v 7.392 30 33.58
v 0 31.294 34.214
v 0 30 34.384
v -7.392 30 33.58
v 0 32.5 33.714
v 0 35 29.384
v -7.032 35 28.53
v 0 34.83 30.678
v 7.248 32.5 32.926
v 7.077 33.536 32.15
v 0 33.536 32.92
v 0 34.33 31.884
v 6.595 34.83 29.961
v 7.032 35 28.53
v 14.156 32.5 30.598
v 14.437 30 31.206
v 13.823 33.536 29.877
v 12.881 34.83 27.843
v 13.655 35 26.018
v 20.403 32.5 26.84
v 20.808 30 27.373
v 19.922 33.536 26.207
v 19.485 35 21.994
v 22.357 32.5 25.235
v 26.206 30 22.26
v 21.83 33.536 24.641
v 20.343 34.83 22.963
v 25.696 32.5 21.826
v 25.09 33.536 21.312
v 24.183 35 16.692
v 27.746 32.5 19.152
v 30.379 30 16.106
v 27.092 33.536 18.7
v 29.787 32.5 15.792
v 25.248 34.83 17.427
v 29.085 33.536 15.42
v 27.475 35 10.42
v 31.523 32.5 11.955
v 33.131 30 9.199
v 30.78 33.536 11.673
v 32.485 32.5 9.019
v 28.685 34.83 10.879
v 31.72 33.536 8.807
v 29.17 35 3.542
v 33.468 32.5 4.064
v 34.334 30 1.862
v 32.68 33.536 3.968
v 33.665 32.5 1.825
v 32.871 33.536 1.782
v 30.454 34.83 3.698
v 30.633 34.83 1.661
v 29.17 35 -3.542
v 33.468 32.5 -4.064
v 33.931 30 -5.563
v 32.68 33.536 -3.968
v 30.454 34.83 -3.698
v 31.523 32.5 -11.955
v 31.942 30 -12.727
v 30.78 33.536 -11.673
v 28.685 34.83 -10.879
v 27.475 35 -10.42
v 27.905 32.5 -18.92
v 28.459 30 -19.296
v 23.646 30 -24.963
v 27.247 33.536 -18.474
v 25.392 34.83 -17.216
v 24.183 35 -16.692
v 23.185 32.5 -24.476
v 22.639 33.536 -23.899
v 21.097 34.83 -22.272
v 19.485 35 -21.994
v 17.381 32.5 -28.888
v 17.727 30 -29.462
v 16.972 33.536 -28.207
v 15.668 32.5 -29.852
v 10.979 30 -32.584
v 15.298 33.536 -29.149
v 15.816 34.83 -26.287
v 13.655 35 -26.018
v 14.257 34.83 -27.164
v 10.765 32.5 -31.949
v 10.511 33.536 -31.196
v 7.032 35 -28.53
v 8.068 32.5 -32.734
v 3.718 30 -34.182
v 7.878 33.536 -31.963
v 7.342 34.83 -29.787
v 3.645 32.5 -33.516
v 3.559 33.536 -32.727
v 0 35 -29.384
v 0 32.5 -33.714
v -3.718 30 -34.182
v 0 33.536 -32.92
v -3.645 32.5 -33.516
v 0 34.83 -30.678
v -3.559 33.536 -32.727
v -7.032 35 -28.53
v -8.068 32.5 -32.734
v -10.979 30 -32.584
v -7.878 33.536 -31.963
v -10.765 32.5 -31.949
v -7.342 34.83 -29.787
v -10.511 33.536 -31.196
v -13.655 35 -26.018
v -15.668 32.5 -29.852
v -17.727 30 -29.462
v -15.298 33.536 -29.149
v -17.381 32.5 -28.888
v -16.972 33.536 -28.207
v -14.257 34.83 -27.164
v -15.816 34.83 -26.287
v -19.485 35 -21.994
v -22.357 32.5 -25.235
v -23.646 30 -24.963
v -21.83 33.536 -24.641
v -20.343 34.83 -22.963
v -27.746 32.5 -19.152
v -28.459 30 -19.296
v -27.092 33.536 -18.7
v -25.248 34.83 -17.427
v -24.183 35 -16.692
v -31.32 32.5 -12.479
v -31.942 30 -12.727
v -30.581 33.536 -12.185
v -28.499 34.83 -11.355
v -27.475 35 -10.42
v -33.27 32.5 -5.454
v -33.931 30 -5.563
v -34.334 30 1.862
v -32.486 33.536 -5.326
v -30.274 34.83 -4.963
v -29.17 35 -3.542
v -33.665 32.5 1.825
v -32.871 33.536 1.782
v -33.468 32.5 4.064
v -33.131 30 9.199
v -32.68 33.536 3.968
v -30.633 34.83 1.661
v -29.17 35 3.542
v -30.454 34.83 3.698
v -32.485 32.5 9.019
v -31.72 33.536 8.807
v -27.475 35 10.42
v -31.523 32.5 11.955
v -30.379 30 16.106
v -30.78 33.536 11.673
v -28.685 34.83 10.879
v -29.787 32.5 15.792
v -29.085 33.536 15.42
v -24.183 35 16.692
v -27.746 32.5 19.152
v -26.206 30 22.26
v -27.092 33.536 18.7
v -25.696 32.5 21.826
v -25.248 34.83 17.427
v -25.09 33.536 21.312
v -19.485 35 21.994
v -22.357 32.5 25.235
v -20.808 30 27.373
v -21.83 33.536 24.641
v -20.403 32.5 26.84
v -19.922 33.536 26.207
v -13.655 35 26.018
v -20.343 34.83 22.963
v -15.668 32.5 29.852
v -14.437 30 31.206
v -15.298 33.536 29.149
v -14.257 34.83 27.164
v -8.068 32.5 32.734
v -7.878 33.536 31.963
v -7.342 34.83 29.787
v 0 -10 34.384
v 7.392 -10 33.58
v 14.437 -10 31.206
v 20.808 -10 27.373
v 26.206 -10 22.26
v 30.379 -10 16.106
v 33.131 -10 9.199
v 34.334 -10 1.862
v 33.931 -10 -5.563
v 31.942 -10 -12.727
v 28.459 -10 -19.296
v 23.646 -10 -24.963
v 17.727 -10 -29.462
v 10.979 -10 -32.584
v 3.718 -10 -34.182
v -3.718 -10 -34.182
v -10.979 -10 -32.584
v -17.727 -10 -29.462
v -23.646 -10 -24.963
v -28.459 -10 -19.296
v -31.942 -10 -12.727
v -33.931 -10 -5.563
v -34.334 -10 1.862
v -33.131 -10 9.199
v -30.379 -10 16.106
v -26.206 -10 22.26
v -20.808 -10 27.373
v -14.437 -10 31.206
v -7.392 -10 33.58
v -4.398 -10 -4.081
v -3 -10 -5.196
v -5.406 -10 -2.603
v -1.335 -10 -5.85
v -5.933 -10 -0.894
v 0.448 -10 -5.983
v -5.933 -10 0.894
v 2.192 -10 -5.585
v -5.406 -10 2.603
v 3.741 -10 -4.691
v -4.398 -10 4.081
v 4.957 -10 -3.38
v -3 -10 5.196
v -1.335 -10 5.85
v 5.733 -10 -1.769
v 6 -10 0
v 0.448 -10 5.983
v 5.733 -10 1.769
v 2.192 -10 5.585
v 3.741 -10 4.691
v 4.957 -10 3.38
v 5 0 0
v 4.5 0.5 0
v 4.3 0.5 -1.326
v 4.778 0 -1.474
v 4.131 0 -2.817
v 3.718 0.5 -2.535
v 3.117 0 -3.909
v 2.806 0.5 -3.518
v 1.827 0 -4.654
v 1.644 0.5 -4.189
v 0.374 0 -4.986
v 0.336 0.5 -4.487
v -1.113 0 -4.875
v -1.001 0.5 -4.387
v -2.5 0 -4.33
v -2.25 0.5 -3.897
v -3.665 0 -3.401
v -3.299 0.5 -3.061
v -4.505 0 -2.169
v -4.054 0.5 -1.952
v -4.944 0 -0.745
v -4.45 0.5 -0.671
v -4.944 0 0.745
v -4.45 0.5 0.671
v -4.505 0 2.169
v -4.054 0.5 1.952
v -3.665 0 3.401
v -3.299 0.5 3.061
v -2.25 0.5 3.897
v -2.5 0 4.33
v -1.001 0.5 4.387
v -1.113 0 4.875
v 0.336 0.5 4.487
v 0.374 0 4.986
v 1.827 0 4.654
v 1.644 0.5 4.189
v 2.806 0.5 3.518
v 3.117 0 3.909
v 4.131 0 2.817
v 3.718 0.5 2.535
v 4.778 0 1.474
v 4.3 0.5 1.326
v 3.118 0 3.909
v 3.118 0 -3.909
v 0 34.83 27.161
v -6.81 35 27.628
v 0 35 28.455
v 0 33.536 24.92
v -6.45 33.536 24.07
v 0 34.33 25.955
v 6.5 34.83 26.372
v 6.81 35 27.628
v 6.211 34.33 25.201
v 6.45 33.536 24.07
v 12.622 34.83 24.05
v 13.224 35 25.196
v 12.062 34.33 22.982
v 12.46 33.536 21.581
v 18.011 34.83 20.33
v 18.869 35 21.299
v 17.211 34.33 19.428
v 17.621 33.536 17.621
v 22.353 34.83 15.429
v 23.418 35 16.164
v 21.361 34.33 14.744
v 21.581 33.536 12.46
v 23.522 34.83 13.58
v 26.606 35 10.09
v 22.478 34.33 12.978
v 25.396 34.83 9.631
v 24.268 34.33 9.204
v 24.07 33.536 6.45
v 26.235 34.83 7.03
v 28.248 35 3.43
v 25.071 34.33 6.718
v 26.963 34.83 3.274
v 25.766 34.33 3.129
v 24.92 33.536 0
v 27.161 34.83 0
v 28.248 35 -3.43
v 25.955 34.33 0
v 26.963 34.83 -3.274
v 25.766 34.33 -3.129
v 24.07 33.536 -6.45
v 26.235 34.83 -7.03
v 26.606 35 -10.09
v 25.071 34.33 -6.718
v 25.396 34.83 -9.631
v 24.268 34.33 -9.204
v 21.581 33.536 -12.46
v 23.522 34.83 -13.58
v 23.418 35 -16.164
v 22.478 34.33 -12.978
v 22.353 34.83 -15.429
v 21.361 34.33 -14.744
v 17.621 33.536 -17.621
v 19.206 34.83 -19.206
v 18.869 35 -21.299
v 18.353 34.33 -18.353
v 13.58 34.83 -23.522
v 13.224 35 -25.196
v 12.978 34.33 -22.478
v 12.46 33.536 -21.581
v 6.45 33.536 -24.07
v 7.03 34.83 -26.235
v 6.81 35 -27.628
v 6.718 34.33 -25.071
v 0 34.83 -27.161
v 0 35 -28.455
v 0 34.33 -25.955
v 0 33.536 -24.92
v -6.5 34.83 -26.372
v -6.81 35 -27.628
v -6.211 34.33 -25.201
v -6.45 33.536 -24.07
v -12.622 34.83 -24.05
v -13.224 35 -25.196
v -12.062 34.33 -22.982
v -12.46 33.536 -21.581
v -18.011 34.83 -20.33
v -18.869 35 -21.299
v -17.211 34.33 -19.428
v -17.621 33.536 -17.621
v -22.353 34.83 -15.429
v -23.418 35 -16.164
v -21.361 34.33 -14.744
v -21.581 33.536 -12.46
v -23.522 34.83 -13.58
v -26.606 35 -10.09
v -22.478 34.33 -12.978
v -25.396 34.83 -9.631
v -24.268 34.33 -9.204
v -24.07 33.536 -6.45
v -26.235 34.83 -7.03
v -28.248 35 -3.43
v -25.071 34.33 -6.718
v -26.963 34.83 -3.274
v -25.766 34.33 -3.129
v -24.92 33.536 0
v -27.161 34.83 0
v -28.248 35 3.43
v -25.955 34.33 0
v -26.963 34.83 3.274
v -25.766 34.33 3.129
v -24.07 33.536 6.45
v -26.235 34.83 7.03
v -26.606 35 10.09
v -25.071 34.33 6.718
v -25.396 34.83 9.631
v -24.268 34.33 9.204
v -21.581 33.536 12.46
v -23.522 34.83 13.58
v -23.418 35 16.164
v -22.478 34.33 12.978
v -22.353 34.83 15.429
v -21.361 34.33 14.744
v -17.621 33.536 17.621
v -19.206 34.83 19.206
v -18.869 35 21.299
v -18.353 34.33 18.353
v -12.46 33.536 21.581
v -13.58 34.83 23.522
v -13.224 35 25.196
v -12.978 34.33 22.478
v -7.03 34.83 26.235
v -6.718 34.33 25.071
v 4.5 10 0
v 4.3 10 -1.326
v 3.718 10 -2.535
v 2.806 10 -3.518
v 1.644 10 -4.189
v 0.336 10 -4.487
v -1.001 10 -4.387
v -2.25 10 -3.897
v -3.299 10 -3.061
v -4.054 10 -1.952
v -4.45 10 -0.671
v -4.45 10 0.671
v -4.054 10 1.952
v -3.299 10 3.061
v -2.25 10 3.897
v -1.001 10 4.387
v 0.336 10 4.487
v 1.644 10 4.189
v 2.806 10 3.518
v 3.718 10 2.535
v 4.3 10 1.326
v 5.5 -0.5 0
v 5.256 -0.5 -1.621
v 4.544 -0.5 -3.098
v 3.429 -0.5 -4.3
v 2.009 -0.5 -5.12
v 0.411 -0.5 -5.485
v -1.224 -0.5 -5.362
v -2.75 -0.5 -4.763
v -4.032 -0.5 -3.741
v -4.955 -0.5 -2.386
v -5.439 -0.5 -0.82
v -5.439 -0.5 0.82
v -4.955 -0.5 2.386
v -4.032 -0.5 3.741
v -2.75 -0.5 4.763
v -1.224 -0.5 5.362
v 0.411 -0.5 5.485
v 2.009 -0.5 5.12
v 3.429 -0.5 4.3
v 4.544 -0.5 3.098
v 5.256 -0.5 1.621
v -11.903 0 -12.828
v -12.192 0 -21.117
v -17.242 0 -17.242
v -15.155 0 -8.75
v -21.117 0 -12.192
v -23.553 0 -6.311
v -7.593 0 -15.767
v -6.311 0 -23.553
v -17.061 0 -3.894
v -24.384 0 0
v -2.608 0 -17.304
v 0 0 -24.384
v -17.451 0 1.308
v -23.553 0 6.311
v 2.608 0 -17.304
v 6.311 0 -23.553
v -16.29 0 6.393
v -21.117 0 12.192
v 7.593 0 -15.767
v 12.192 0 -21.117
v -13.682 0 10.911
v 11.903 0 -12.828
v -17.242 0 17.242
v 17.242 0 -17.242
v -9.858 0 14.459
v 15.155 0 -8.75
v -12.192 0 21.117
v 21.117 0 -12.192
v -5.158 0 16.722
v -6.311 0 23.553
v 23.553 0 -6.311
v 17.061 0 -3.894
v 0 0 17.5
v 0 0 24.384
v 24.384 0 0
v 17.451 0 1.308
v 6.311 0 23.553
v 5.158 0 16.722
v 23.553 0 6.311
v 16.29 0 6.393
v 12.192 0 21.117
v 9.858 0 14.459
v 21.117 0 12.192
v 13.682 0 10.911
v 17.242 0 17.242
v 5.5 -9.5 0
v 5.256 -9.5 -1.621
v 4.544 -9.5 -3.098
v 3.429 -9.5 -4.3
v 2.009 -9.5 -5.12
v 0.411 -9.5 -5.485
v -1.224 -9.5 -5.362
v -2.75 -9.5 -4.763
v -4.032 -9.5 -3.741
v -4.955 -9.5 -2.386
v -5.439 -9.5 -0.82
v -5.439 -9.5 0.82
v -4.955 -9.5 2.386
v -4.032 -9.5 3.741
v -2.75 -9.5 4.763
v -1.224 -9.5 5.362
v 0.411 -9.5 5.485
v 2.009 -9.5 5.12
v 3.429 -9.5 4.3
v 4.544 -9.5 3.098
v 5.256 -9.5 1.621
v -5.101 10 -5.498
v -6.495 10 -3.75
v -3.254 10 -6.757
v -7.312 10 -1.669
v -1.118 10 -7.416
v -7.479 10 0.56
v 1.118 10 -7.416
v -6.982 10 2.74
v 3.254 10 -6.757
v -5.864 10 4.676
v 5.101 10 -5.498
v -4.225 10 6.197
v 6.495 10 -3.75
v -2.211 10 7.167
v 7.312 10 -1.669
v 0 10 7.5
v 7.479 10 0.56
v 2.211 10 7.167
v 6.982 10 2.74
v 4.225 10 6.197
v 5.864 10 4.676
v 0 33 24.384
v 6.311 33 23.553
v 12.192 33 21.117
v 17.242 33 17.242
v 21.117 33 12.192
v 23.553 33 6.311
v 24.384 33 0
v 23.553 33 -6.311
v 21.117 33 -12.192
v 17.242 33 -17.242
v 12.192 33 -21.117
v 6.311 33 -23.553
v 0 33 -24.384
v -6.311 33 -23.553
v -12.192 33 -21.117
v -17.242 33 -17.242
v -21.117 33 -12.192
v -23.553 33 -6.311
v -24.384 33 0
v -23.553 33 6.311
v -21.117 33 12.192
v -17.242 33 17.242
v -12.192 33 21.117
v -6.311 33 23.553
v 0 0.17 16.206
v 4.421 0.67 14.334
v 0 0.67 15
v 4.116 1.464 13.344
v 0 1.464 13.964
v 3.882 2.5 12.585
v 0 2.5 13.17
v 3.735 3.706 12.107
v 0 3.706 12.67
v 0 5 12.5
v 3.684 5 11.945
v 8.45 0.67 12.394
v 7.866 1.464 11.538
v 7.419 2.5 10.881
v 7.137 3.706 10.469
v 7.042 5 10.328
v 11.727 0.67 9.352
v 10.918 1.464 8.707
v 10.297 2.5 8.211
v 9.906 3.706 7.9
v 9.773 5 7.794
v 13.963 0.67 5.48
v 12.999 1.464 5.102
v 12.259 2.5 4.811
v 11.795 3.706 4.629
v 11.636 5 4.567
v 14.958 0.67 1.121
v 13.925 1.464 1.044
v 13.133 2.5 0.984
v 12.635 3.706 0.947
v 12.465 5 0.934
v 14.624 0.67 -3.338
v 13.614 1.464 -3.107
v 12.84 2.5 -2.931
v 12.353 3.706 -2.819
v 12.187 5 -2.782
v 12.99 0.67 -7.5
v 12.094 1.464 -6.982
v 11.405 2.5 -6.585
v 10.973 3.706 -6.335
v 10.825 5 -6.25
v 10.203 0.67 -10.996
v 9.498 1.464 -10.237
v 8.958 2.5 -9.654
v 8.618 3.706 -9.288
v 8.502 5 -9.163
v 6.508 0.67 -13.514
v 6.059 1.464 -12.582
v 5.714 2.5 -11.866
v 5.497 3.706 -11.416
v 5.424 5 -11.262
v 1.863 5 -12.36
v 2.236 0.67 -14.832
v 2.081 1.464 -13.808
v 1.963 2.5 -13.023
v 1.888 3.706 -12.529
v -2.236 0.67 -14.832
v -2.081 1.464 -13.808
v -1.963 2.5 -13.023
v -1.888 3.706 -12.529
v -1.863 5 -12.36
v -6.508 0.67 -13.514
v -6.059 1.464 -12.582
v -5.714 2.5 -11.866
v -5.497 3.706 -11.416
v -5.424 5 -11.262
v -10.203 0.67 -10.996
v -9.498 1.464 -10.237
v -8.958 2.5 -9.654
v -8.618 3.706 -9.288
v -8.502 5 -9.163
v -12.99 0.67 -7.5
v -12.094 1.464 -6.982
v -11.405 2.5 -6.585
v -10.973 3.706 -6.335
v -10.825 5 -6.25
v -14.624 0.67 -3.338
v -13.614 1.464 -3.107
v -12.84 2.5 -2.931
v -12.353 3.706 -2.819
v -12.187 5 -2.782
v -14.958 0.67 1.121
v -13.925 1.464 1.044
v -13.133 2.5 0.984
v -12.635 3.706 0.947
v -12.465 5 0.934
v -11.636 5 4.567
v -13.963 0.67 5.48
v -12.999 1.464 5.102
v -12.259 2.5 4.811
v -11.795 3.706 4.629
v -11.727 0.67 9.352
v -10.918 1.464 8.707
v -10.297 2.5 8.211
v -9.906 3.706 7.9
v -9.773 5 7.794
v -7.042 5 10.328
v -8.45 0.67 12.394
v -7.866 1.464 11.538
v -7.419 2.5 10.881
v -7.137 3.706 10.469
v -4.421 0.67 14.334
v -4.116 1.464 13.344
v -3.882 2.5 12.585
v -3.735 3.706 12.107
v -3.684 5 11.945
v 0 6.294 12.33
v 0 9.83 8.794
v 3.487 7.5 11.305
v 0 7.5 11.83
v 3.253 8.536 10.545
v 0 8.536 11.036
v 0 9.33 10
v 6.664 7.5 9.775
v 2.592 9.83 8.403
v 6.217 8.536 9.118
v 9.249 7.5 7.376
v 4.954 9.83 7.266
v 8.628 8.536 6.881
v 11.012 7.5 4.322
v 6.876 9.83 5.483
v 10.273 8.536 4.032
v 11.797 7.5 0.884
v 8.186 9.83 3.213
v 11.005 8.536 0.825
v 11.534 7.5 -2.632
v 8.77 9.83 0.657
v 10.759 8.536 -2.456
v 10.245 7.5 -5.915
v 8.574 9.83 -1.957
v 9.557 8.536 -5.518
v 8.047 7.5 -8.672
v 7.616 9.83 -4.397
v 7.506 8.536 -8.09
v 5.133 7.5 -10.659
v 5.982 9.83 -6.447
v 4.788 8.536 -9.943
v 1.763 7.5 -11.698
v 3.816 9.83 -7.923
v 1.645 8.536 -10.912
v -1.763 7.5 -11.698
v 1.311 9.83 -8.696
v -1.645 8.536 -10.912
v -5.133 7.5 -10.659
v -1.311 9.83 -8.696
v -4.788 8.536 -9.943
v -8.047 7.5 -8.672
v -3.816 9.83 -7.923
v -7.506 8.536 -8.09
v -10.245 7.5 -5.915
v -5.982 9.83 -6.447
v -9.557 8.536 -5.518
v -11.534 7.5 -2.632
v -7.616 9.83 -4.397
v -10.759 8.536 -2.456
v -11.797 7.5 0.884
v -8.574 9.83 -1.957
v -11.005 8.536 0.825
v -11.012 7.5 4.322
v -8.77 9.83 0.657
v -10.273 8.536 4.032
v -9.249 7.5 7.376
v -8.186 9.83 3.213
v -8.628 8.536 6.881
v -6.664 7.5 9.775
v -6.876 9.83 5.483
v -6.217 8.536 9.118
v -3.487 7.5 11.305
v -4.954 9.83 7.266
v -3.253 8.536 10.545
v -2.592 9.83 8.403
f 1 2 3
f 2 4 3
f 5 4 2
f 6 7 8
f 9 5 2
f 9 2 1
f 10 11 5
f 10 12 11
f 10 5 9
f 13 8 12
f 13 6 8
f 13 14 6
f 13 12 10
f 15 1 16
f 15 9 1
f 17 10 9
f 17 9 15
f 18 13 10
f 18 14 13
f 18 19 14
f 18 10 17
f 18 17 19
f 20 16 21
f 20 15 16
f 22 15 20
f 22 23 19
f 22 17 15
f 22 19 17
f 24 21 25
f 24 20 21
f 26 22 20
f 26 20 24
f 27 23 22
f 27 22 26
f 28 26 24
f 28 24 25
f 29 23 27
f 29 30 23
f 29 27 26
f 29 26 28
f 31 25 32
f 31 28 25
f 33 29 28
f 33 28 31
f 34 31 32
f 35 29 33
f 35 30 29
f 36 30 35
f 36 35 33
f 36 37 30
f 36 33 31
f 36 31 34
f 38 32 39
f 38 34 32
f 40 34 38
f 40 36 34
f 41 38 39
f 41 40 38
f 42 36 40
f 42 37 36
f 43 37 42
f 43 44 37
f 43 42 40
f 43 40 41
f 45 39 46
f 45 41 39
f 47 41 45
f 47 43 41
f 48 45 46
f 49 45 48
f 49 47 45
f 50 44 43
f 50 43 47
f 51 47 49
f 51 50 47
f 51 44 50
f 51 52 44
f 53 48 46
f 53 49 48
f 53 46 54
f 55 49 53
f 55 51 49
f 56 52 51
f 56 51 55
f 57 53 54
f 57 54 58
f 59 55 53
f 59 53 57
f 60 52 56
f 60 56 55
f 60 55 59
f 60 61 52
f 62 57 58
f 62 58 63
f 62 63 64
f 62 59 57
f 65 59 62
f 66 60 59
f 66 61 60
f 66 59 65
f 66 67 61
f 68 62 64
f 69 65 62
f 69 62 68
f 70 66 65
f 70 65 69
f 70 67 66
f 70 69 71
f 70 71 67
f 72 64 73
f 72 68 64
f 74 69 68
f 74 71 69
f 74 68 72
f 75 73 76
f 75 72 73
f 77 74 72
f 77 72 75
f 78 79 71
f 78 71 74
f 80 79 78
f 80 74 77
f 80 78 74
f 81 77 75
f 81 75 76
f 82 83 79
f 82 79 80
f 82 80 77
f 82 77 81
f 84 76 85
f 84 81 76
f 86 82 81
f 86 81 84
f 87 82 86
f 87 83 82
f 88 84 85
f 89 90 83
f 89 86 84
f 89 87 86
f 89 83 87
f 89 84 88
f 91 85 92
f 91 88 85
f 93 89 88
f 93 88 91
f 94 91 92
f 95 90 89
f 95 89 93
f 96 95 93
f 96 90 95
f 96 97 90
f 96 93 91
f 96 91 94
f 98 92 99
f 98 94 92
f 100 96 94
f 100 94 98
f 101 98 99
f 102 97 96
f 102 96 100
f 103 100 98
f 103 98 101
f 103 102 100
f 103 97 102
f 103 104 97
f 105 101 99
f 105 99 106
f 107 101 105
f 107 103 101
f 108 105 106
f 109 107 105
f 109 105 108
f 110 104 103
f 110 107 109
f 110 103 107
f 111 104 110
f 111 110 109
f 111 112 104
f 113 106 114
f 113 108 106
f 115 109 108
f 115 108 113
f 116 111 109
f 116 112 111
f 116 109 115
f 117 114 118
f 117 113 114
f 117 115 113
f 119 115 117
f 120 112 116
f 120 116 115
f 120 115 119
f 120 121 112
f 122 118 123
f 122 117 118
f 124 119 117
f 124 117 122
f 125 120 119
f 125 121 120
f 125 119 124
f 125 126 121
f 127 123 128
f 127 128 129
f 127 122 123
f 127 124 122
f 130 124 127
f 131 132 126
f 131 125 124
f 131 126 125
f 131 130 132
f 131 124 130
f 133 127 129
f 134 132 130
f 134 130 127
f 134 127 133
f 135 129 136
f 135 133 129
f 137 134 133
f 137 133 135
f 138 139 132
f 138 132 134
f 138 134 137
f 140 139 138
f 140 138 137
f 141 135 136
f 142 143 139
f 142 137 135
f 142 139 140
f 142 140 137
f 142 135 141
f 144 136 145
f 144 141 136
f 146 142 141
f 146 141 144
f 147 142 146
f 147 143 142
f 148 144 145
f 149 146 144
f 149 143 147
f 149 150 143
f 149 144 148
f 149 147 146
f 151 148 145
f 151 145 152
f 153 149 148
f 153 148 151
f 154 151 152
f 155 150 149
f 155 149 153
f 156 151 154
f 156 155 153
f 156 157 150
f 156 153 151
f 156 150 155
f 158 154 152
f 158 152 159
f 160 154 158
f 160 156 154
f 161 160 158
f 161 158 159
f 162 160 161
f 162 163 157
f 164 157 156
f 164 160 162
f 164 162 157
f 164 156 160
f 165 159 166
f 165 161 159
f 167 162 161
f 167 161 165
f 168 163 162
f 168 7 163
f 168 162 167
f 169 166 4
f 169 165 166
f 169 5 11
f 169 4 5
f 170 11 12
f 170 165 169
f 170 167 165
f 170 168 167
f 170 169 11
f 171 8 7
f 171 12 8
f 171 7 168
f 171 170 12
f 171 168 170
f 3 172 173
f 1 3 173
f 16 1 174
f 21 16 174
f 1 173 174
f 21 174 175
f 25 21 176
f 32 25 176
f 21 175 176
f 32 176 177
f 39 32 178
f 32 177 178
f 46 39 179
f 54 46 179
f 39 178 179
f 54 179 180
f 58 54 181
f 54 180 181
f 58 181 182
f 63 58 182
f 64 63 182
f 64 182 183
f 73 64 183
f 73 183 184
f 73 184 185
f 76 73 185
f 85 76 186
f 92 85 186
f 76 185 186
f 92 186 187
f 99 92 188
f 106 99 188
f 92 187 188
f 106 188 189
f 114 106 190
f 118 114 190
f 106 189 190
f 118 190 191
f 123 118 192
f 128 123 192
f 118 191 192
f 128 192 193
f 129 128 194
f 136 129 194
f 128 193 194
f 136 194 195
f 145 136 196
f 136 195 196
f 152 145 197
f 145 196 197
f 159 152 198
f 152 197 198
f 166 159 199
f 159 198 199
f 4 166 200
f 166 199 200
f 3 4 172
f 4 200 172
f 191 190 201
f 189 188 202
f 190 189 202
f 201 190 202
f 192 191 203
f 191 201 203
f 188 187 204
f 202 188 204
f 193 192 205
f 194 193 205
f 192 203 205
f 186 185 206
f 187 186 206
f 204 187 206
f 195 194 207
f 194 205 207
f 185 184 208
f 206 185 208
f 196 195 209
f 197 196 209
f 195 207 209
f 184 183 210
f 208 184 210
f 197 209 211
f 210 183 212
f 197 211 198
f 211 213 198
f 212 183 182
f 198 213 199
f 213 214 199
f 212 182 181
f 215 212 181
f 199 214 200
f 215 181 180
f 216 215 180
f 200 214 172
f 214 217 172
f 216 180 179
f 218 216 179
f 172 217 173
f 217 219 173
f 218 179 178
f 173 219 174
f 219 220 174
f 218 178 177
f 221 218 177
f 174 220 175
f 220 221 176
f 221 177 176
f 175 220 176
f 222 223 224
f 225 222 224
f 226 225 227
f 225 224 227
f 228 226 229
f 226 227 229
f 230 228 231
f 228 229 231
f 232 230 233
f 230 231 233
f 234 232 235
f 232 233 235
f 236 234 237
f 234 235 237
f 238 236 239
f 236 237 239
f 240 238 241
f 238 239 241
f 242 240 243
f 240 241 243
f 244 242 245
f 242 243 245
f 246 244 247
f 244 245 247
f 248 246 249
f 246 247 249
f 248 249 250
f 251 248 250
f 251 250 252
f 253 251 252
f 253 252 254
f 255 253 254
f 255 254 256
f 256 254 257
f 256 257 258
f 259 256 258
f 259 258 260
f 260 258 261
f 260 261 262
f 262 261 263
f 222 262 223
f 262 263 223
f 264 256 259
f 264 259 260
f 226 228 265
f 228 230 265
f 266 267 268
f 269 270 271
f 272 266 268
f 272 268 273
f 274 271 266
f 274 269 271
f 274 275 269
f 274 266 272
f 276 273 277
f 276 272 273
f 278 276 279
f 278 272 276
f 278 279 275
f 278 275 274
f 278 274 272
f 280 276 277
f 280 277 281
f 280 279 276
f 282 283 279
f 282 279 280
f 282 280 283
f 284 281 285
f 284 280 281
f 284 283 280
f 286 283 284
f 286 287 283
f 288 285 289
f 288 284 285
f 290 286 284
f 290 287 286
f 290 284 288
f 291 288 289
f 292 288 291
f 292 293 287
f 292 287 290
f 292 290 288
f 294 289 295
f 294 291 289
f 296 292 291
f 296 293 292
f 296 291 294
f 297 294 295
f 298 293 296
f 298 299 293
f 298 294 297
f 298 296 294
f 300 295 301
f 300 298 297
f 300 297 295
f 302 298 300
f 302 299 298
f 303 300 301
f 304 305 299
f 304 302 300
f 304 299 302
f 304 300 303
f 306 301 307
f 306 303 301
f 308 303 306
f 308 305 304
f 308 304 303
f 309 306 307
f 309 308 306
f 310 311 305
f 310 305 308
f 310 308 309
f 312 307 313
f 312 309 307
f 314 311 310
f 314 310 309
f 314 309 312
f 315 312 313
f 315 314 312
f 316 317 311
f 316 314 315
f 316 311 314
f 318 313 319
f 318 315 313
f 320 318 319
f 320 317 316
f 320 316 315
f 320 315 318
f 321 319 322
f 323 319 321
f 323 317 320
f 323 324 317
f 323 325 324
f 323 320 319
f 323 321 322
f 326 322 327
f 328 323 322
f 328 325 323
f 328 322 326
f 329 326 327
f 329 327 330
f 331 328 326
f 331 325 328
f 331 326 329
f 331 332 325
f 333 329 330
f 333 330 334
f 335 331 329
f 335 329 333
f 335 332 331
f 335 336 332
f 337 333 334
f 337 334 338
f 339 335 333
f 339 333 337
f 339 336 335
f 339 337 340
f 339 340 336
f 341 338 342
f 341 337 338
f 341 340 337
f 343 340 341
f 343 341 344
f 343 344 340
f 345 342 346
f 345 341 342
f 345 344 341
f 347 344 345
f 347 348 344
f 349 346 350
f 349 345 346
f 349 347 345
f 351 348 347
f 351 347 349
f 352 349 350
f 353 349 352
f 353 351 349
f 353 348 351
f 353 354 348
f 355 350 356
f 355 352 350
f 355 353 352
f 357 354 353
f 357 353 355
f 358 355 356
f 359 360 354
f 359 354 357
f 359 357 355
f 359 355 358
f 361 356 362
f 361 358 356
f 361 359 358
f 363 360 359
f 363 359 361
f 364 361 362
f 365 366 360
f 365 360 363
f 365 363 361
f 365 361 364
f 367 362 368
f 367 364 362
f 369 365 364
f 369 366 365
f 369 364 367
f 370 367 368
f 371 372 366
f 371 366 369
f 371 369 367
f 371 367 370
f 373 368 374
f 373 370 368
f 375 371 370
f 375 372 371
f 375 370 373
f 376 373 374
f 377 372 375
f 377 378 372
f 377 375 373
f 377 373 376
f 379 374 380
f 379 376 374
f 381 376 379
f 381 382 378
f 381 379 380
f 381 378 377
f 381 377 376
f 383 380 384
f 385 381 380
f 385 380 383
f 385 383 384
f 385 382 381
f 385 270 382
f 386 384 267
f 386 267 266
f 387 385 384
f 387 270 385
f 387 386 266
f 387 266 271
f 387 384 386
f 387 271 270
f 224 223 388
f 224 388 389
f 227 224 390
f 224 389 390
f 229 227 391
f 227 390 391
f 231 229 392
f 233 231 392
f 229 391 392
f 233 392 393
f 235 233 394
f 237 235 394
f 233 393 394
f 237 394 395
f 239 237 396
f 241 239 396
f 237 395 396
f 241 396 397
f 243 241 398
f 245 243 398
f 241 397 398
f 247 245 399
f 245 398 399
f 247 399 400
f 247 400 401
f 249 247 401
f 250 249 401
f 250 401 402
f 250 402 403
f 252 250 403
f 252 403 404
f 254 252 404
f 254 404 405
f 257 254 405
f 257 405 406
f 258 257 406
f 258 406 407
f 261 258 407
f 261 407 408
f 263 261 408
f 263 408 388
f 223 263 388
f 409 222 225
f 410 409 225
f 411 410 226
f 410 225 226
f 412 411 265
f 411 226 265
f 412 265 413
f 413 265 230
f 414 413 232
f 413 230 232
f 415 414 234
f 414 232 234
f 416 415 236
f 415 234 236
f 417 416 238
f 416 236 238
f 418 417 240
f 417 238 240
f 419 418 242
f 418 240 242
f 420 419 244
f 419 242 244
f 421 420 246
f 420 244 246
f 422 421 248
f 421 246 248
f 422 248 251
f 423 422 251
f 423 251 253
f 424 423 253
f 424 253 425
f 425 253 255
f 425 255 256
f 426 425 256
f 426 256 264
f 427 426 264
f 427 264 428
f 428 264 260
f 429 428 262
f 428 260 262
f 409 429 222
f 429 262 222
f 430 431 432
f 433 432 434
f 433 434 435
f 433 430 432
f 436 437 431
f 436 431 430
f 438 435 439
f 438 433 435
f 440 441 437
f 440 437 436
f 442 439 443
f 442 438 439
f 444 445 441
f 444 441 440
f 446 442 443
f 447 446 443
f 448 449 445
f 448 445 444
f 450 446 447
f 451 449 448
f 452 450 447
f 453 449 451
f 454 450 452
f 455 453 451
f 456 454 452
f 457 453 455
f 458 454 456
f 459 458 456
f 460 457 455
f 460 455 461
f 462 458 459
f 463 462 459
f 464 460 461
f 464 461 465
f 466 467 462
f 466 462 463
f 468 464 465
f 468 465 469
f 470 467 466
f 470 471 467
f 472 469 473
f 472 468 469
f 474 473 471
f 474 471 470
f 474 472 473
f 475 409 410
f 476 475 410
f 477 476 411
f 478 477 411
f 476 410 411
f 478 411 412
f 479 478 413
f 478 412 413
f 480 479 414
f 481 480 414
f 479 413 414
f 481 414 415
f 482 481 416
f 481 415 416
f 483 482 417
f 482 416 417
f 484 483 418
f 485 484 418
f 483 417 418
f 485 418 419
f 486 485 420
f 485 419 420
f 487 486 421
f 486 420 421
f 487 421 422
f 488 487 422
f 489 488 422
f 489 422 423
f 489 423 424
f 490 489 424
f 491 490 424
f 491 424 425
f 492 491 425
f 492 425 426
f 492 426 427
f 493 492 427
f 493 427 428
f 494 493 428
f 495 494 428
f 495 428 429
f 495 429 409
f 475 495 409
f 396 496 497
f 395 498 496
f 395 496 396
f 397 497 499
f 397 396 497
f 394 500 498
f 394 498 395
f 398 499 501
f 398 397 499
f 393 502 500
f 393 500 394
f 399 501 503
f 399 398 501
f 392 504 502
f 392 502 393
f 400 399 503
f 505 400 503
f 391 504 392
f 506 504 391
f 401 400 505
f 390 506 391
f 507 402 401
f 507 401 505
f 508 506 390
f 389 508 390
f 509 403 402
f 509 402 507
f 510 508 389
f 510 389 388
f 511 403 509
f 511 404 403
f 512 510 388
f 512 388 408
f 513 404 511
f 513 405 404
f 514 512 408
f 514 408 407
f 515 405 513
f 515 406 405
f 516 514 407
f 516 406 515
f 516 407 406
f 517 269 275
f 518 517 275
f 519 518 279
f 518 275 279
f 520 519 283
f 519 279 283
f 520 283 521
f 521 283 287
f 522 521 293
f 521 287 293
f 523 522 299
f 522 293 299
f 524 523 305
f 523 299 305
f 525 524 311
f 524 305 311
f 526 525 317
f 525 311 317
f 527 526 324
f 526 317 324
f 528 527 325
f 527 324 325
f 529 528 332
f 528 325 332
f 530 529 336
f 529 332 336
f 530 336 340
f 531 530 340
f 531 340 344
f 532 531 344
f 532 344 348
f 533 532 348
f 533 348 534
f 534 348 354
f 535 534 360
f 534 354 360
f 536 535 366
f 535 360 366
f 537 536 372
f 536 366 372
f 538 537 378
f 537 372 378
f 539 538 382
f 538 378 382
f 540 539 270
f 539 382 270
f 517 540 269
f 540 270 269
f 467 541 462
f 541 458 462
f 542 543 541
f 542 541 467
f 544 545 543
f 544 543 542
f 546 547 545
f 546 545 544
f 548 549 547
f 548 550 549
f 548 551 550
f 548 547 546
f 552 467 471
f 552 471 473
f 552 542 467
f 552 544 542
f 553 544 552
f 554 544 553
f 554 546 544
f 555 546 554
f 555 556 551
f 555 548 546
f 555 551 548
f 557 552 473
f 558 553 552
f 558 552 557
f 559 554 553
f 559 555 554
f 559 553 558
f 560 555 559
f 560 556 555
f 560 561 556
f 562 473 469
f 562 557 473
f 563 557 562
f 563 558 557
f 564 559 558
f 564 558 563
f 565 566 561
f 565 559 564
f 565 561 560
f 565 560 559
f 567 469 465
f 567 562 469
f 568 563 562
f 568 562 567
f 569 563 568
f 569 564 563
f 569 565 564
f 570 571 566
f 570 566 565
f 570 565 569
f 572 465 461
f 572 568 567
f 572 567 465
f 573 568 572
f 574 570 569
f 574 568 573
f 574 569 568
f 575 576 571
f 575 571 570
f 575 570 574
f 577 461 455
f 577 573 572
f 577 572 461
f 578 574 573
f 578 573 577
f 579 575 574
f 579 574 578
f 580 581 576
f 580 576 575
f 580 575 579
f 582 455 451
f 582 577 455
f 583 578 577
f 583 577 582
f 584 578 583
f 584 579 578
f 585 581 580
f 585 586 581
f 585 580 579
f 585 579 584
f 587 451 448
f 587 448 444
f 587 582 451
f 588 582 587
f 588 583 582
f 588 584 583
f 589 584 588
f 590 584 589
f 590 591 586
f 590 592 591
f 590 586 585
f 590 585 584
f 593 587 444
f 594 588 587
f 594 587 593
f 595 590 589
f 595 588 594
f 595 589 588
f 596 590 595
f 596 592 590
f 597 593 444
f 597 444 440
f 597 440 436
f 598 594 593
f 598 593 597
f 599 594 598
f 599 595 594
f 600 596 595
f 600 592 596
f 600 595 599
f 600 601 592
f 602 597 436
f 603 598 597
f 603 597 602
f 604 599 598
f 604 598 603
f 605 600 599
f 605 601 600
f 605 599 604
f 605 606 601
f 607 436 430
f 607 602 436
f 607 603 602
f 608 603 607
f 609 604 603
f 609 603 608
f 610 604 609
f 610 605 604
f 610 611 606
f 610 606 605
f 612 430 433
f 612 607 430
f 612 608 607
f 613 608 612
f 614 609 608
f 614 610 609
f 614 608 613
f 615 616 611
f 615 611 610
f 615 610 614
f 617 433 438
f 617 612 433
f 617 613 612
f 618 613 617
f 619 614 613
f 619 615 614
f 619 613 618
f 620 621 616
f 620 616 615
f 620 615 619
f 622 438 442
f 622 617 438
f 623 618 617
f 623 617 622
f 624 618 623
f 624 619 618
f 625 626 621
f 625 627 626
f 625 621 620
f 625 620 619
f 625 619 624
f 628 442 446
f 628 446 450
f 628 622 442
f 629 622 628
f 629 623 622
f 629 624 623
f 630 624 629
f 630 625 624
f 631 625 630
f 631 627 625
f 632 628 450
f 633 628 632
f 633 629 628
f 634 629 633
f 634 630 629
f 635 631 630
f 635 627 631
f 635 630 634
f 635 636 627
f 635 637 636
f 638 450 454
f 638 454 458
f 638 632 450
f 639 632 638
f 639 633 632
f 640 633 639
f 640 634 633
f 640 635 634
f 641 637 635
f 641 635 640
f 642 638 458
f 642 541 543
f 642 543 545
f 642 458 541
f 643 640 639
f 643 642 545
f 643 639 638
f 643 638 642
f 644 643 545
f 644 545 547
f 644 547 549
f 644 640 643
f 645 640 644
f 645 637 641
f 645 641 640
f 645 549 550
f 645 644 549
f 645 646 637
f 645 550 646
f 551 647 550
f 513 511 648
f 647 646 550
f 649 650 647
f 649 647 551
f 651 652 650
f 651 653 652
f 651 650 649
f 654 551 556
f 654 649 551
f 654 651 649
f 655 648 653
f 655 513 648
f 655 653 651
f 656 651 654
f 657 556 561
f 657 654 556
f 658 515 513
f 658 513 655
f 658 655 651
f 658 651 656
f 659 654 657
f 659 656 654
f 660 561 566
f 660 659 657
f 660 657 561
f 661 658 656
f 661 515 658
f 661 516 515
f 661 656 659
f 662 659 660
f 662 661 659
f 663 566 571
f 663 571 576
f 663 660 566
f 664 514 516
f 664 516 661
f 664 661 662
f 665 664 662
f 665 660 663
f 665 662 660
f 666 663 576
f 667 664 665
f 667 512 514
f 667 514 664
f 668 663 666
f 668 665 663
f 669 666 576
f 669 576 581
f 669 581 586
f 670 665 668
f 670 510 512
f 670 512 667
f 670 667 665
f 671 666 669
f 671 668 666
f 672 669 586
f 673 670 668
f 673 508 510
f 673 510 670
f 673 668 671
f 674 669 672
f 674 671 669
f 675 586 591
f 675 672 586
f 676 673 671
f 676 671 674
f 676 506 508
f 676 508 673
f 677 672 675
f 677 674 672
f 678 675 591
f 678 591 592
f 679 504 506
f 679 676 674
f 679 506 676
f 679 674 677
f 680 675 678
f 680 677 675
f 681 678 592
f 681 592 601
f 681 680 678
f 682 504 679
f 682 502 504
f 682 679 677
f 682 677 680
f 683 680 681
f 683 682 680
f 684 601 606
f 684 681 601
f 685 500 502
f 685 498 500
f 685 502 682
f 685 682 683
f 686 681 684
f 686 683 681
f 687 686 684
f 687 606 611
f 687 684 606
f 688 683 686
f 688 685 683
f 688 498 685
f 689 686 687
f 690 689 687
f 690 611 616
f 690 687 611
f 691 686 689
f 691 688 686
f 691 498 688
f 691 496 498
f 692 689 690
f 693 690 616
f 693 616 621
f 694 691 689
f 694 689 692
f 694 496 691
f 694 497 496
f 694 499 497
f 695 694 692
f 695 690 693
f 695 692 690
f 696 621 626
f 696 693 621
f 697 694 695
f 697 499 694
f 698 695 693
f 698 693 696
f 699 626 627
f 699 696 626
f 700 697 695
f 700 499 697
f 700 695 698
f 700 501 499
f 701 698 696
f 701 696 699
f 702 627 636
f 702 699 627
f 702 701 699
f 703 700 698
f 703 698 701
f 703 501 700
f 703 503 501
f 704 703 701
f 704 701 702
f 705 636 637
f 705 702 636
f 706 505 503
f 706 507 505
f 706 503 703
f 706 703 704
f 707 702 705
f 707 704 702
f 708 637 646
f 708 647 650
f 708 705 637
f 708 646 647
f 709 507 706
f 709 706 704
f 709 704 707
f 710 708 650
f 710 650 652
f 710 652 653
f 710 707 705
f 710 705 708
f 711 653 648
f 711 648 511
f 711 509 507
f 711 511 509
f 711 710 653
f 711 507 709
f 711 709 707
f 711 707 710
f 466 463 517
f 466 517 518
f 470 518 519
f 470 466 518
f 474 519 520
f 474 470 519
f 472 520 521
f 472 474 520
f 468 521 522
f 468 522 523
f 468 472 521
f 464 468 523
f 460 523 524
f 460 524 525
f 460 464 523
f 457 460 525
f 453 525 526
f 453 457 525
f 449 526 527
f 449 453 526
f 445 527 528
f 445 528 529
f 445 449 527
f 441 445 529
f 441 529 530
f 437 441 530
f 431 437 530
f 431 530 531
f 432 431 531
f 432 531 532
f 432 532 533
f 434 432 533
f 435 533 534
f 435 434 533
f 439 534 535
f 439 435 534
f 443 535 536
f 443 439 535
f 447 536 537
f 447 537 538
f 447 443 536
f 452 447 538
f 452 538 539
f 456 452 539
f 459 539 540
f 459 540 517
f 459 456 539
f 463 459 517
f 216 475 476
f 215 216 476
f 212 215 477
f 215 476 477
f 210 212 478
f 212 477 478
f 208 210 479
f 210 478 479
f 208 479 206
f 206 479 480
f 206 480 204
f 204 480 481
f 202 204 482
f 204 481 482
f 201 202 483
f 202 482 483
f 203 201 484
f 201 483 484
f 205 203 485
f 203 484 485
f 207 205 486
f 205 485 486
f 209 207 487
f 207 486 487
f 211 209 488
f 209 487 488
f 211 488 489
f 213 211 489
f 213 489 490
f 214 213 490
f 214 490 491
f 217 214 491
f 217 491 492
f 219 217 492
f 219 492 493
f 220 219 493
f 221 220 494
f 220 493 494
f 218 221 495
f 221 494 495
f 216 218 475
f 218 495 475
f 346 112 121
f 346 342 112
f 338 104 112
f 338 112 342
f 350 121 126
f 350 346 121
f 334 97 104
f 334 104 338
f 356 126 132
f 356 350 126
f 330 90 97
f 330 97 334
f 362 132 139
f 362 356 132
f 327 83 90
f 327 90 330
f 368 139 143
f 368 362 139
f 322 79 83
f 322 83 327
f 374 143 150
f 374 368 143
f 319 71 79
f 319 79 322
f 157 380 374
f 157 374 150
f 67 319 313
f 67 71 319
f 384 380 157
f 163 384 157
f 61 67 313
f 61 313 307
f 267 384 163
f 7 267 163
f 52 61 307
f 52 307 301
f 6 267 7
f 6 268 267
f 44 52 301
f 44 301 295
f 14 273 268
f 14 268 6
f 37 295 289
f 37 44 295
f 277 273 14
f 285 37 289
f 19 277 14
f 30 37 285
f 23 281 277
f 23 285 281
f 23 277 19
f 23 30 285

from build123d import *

# Parameters (mm, degrees)
SKETCH1_R                  = 34.384
SKETCH1_R_2                = 24.384
BOSS_EXTRUDE1_DEPTH        = 35
BOSS_EXTRUDE2_START        = -10
SKETCH1_3_R                = 34.384
BOSS_EXTRUDE2_DEPTH        = 10
SKETCH3_R                  = 12.5
BOSS_EXTRUDE3_DEPTH        = 10
FILLET1_R                  = 5
F_12_0MM_DOWEL_HOLE1_D     = 11
F_12_0MM_DOWEL_HOLE1_DEPTH = 10
F_8_0MM_DOWEL_HOLE2_D      = 9
CHAMFER1_SIZE              = 2
CHAMFER2_SIZE              = 0.5
CHAMFER4_SIZE              = 0.5
FILLET2_R                  = 5


with BuildPart() as part:
    # Sketch1 → Boss-Extrude1 (new body)
    with BuildSketch(Plane(origin=(0, 0, 0), x_dir=(1, 0, 0), z_dir=(0, 1, 0))):
        with Locations(Location((0, 0, 0), (0, 0, 270))):
            Circle(SKETCH1_R)
        with Locations(Location((0, 0, 0), (0, 0, 270))):
            Circle(SKETCH1_R_2, mode=Mode.SUBTRACT)
    extrude(amount=BOSS_EXTRUDE1_DEPTH)

    # Sketch1<3> → Boss-Extrude2 (add)
    with BuildSketch(Plane(origin=(0, 0, 0), x_dir=(1, 0, 0), z_dir=(0, 1, 0)).offset(BOSS_EXTRUDE2_START)):
        with Locations(Location((0, 0, 0), (0, 0, 270))):
            Circle(SKETCH1_3_R)
    extrude(amount=BOSS_EXTRUDE2_DEPTH)

    # Sketch3 → Boss-Extrude3 (add)
    with BuildSketch(Plane(origin=(0, 0, 0), x_dir=(1, 0, 0), z_dir=(0, 1, 0))):
        with Locations(Location((0, 0, 0), (0, 0, 270))):
            Circle(SKETCH3_R)
    extrude(amount=BOSS_EXTRUDE3_DEPTH)

    # Fillet1
    fillet1_edges = [part.edges().sort_by_distance(p)[0] for p in [
        (0, 0, -12.5),
        (0, 10, -12.5),
    ]]
    fillet(fillet1_edges, radius=FILLET1_R - 0.0001)  # a hair under: the kernel refuses the full size

    # Ø12.0mm Dowel Hole1
    with Locations(Plane(origin=(0, -10, 0), x_dir=(-1, 0, 0), z_dir=(0, -1, 0))):
        with Locations((0, 0)):
            Hole(F_12_0MM_DOWEL_HOLE1_D / 2, depth=F_12_0MM_DOWEL_HOLE1_DEPTH)

    # Ø8.0mm Dowel Hole2 (through all)
    with Locations(Plane(origin=(0, 0, 0), x_dir=(-1, 0, 0), z_dir=(0, -1, 0))):
        with Locations((0, 0)):
            Hole(F_8_0MM_DOWEL_HOLE2_D / 2)

    # Chamfer1
    chamfer1_edges = [part.edges().sort_by_distance(p)[0] for p in [
        (0, 35, -24.384),
    ]]
    chamfer(chamfer1_edges, length=CHAMFER1_SIZE)

    # Chamfer2
    chamfer2_edges = [part.edges().sort_by_distance(p)[0] for p in [
        (-5.5, -10, 0),
    ]]
    chamfer(chamfer2_edges, length=CHAMFER2_SIZE)

    # Chamfer4
    chamfer4_edges = [part.edges().sort_by_distance(p)[0] for p in [
        (-5.5, 0, 0),
        (-4.5, 0, 0),
    ]]
    chamfer(chamfer4_edges, length=CHAMFER4_SIZE - 0.0001)  # a hair under: the kernel refuses the full size

    # Fillet2
    fillet2_edges = [part.edges().sort_by_distance(p)[0] for p in [
        (0, 35, -26.384),
        (0, 35, -34.384),
    ]]
    fillet(fillet2_edges, radius=FILLET2_R)


solid = part.part
